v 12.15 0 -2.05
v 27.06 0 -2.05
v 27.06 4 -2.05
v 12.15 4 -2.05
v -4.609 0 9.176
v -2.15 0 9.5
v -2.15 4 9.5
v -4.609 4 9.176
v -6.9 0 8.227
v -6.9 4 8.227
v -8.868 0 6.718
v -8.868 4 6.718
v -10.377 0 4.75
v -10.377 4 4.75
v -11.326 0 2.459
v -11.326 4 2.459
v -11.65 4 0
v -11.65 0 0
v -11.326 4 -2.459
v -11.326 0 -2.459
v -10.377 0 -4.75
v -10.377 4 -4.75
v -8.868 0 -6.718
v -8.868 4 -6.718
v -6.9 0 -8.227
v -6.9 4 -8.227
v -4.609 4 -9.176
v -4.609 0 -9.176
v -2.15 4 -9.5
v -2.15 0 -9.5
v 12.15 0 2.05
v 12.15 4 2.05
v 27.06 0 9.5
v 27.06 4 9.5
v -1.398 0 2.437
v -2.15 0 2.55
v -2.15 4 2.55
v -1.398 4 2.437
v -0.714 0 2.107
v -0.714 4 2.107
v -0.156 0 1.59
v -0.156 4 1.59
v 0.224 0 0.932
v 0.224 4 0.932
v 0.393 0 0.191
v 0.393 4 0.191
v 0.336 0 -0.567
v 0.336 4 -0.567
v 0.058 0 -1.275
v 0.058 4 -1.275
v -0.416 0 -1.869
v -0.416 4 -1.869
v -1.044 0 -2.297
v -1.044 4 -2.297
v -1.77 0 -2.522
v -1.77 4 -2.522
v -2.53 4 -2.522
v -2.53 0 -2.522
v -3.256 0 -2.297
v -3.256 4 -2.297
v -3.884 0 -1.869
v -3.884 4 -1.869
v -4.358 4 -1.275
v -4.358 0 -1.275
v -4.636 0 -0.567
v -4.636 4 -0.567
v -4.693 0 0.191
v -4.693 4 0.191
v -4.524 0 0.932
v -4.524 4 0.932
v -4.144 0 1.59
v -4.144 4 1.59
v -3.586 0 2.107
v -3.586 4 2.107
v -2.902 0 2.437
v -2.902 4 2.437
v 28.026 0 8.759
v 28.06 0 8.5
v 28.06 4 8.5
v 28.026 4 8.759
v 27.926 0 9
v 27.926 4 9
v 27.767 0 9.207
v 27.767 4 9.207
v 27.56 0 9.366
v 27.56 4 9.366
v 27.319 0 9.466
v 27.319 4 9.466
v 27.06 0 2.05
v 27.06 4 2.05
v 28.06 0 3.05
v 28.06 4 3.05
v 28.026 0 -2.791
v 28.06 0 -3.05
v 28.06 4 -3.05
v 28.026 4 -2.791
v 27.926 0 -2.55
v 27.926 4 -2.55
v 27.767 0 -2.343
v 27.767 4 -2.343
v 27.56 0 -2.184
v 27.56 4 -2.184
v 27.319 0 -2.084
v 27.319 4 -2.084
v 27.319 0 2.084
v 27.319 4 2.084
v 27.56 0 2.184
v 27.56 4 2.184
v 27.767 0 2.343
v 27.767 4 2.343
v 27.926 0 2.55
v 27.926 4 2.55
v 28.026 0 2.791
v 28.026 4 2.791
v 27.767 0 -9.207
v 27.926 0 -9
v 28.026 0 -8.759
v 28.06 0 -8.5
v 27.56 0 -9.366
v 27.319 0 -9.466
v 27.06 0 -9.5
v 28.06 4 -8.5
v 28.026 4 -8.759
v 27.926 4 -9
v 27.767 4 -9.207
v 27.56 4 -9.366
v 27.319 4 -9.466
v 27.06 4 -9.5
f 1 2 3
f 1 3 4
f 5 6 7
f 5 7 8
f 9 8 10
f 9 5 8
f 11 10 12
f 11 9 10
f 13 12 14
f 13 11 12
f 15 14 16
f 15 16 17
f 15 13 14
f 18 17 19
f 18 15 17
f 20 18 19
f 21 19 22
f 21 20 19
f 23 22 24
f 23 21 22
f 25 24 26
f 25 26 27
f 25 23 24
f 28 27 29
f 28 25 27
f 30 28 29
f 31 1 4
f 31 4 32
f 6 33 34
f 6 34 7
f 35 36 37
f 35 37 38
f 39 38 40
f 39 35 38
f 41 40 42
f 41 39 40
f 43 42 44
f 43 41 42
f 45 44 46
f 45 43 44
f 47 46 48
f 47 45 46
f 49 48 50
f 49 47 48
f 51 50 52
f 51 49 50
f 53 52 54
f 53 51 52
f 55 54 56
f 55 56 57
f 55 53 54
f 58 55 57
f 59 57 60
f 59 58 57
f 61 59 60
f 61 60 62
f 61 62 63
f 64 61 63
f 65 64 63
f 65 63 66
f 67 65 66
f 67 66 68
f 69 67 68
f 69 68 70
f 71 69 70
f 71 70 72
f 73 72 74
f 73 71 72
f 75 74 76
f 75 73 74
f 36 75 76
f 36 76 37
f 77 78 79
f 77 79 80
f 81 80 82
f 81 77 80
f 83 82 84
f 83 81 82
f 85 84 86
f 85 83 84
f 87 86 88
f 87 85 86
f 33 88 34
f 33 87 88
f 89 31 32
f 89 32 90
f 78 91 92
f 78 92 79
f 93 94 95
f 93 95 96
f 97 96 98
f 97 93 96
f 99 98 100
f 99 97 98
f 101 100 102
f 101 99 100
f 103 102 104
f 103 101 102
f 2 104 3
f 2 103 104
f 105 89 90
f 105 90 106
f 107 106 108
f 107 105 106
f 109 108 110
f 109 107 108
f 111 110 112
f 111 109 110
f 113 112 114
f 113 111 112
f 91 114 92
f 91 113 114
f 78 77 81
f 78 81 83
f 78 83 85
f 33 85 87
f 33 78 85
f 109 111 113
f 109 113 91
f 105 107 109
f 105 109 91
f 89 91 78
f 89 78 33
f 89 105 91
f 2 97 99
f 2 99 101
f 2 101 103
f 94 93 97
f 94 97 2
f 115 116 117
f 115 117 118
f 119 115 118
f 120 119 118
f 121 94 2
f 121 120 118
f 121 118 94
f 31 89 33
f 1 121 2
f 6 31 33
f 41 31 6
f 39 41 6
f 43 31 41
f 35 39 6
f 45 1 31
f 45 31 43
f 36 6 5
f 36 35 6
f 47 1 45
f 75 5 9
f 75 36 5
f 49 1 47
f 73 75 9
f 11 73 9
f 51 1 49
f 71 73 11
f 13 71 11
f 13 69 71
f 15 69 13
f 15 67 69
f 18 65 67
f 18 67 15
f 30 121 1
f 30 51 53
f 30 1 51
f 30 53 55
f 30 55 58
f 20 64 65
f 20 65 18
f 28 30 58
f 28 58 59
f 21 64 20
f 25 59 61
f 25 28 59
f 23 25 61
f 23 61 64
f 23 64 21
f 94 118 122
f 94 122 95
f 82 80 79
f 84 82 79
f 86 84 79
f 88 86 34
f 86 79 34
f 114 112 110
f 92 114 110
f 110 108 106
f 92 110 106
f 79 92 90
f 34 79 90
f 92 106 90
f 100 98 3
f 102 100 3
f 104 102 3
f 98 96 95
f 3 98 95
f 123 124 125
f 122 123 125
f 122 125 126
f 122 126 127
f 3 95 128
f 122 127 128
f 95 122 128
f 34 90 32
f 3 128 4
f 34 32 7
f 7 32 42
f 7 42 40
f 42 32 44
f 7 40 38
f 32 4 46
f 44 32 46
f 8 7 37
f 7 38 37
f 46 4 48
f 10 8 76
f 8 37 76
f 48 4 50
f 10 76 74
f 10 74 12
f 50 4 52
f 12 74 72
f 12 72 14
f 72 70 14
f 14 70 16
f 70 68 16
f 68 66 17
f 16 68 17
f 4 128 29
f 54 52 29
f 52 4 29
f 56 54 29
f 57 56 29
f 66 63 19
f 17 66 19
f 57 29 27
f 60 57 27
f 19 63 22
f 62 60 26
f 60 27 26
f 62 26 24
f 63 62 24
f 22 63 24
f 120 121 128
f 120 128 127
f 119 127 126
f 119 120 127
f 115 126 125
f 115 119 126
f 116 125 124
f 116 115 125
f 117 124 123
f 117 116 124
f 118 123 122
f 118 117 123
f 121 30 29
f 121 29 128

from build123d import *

# Parameters (mm, degrees)
SKETCH1_R           = 2.55
BOSS_EXTRUDE1_DEPTH = 4


with BuildPart() as part:
    # Sketch1 → Boss-Extrude1 (new body)
    with BuildSketch(Plane(origin=(0, 0, 0), x_dir=(1, 0, 0), z_dir=(0, 1, 0))):
        with BuildLine():
            Line((27.06, 2.05), (12.15, 2.05))
            Line((12.15, 2.05), (12.15, -2.05))
            Line((12.15, -2.05), (27.06, -2.05))
            ThreePointArc((27.06, -2.05), (27.767106781, -2.342893219), (28.06, -3.05))
            Line((28.06, -3.05), (28.06, -8.5))
            ThreePointArc((28.06, -8.5), (27.767106781, -9.207106781), (27.06, -9.5))
            Line((27.06, -9.5), (-2.15, -9.5))
            ThreePointArc((-2.15, -9.5), (-11.65, 0), (-2.15, 9.5))
            Line((-2.15, 9.5), (27.06, 9.5))
            ThreePointArc((27.06, 9.5), (27.767106781, 9.207106781), (28.06, 8.5))
            Line((28.06, 8.5), (28.06, 3.05))
            ThreePointArc((28.06, 3.05), (27.767106781, 2.342893219), (27.06, 2.05))
        make_face()
        with Locations(Location((-2.15, 0, 0), (0, 0, 270))):
            Circle(SKETCH1_R, mode=Mode.SUBTRACT)
    extrude(amount=BOSS_EXTRUDE1_DEPTH)


solid = part.part
